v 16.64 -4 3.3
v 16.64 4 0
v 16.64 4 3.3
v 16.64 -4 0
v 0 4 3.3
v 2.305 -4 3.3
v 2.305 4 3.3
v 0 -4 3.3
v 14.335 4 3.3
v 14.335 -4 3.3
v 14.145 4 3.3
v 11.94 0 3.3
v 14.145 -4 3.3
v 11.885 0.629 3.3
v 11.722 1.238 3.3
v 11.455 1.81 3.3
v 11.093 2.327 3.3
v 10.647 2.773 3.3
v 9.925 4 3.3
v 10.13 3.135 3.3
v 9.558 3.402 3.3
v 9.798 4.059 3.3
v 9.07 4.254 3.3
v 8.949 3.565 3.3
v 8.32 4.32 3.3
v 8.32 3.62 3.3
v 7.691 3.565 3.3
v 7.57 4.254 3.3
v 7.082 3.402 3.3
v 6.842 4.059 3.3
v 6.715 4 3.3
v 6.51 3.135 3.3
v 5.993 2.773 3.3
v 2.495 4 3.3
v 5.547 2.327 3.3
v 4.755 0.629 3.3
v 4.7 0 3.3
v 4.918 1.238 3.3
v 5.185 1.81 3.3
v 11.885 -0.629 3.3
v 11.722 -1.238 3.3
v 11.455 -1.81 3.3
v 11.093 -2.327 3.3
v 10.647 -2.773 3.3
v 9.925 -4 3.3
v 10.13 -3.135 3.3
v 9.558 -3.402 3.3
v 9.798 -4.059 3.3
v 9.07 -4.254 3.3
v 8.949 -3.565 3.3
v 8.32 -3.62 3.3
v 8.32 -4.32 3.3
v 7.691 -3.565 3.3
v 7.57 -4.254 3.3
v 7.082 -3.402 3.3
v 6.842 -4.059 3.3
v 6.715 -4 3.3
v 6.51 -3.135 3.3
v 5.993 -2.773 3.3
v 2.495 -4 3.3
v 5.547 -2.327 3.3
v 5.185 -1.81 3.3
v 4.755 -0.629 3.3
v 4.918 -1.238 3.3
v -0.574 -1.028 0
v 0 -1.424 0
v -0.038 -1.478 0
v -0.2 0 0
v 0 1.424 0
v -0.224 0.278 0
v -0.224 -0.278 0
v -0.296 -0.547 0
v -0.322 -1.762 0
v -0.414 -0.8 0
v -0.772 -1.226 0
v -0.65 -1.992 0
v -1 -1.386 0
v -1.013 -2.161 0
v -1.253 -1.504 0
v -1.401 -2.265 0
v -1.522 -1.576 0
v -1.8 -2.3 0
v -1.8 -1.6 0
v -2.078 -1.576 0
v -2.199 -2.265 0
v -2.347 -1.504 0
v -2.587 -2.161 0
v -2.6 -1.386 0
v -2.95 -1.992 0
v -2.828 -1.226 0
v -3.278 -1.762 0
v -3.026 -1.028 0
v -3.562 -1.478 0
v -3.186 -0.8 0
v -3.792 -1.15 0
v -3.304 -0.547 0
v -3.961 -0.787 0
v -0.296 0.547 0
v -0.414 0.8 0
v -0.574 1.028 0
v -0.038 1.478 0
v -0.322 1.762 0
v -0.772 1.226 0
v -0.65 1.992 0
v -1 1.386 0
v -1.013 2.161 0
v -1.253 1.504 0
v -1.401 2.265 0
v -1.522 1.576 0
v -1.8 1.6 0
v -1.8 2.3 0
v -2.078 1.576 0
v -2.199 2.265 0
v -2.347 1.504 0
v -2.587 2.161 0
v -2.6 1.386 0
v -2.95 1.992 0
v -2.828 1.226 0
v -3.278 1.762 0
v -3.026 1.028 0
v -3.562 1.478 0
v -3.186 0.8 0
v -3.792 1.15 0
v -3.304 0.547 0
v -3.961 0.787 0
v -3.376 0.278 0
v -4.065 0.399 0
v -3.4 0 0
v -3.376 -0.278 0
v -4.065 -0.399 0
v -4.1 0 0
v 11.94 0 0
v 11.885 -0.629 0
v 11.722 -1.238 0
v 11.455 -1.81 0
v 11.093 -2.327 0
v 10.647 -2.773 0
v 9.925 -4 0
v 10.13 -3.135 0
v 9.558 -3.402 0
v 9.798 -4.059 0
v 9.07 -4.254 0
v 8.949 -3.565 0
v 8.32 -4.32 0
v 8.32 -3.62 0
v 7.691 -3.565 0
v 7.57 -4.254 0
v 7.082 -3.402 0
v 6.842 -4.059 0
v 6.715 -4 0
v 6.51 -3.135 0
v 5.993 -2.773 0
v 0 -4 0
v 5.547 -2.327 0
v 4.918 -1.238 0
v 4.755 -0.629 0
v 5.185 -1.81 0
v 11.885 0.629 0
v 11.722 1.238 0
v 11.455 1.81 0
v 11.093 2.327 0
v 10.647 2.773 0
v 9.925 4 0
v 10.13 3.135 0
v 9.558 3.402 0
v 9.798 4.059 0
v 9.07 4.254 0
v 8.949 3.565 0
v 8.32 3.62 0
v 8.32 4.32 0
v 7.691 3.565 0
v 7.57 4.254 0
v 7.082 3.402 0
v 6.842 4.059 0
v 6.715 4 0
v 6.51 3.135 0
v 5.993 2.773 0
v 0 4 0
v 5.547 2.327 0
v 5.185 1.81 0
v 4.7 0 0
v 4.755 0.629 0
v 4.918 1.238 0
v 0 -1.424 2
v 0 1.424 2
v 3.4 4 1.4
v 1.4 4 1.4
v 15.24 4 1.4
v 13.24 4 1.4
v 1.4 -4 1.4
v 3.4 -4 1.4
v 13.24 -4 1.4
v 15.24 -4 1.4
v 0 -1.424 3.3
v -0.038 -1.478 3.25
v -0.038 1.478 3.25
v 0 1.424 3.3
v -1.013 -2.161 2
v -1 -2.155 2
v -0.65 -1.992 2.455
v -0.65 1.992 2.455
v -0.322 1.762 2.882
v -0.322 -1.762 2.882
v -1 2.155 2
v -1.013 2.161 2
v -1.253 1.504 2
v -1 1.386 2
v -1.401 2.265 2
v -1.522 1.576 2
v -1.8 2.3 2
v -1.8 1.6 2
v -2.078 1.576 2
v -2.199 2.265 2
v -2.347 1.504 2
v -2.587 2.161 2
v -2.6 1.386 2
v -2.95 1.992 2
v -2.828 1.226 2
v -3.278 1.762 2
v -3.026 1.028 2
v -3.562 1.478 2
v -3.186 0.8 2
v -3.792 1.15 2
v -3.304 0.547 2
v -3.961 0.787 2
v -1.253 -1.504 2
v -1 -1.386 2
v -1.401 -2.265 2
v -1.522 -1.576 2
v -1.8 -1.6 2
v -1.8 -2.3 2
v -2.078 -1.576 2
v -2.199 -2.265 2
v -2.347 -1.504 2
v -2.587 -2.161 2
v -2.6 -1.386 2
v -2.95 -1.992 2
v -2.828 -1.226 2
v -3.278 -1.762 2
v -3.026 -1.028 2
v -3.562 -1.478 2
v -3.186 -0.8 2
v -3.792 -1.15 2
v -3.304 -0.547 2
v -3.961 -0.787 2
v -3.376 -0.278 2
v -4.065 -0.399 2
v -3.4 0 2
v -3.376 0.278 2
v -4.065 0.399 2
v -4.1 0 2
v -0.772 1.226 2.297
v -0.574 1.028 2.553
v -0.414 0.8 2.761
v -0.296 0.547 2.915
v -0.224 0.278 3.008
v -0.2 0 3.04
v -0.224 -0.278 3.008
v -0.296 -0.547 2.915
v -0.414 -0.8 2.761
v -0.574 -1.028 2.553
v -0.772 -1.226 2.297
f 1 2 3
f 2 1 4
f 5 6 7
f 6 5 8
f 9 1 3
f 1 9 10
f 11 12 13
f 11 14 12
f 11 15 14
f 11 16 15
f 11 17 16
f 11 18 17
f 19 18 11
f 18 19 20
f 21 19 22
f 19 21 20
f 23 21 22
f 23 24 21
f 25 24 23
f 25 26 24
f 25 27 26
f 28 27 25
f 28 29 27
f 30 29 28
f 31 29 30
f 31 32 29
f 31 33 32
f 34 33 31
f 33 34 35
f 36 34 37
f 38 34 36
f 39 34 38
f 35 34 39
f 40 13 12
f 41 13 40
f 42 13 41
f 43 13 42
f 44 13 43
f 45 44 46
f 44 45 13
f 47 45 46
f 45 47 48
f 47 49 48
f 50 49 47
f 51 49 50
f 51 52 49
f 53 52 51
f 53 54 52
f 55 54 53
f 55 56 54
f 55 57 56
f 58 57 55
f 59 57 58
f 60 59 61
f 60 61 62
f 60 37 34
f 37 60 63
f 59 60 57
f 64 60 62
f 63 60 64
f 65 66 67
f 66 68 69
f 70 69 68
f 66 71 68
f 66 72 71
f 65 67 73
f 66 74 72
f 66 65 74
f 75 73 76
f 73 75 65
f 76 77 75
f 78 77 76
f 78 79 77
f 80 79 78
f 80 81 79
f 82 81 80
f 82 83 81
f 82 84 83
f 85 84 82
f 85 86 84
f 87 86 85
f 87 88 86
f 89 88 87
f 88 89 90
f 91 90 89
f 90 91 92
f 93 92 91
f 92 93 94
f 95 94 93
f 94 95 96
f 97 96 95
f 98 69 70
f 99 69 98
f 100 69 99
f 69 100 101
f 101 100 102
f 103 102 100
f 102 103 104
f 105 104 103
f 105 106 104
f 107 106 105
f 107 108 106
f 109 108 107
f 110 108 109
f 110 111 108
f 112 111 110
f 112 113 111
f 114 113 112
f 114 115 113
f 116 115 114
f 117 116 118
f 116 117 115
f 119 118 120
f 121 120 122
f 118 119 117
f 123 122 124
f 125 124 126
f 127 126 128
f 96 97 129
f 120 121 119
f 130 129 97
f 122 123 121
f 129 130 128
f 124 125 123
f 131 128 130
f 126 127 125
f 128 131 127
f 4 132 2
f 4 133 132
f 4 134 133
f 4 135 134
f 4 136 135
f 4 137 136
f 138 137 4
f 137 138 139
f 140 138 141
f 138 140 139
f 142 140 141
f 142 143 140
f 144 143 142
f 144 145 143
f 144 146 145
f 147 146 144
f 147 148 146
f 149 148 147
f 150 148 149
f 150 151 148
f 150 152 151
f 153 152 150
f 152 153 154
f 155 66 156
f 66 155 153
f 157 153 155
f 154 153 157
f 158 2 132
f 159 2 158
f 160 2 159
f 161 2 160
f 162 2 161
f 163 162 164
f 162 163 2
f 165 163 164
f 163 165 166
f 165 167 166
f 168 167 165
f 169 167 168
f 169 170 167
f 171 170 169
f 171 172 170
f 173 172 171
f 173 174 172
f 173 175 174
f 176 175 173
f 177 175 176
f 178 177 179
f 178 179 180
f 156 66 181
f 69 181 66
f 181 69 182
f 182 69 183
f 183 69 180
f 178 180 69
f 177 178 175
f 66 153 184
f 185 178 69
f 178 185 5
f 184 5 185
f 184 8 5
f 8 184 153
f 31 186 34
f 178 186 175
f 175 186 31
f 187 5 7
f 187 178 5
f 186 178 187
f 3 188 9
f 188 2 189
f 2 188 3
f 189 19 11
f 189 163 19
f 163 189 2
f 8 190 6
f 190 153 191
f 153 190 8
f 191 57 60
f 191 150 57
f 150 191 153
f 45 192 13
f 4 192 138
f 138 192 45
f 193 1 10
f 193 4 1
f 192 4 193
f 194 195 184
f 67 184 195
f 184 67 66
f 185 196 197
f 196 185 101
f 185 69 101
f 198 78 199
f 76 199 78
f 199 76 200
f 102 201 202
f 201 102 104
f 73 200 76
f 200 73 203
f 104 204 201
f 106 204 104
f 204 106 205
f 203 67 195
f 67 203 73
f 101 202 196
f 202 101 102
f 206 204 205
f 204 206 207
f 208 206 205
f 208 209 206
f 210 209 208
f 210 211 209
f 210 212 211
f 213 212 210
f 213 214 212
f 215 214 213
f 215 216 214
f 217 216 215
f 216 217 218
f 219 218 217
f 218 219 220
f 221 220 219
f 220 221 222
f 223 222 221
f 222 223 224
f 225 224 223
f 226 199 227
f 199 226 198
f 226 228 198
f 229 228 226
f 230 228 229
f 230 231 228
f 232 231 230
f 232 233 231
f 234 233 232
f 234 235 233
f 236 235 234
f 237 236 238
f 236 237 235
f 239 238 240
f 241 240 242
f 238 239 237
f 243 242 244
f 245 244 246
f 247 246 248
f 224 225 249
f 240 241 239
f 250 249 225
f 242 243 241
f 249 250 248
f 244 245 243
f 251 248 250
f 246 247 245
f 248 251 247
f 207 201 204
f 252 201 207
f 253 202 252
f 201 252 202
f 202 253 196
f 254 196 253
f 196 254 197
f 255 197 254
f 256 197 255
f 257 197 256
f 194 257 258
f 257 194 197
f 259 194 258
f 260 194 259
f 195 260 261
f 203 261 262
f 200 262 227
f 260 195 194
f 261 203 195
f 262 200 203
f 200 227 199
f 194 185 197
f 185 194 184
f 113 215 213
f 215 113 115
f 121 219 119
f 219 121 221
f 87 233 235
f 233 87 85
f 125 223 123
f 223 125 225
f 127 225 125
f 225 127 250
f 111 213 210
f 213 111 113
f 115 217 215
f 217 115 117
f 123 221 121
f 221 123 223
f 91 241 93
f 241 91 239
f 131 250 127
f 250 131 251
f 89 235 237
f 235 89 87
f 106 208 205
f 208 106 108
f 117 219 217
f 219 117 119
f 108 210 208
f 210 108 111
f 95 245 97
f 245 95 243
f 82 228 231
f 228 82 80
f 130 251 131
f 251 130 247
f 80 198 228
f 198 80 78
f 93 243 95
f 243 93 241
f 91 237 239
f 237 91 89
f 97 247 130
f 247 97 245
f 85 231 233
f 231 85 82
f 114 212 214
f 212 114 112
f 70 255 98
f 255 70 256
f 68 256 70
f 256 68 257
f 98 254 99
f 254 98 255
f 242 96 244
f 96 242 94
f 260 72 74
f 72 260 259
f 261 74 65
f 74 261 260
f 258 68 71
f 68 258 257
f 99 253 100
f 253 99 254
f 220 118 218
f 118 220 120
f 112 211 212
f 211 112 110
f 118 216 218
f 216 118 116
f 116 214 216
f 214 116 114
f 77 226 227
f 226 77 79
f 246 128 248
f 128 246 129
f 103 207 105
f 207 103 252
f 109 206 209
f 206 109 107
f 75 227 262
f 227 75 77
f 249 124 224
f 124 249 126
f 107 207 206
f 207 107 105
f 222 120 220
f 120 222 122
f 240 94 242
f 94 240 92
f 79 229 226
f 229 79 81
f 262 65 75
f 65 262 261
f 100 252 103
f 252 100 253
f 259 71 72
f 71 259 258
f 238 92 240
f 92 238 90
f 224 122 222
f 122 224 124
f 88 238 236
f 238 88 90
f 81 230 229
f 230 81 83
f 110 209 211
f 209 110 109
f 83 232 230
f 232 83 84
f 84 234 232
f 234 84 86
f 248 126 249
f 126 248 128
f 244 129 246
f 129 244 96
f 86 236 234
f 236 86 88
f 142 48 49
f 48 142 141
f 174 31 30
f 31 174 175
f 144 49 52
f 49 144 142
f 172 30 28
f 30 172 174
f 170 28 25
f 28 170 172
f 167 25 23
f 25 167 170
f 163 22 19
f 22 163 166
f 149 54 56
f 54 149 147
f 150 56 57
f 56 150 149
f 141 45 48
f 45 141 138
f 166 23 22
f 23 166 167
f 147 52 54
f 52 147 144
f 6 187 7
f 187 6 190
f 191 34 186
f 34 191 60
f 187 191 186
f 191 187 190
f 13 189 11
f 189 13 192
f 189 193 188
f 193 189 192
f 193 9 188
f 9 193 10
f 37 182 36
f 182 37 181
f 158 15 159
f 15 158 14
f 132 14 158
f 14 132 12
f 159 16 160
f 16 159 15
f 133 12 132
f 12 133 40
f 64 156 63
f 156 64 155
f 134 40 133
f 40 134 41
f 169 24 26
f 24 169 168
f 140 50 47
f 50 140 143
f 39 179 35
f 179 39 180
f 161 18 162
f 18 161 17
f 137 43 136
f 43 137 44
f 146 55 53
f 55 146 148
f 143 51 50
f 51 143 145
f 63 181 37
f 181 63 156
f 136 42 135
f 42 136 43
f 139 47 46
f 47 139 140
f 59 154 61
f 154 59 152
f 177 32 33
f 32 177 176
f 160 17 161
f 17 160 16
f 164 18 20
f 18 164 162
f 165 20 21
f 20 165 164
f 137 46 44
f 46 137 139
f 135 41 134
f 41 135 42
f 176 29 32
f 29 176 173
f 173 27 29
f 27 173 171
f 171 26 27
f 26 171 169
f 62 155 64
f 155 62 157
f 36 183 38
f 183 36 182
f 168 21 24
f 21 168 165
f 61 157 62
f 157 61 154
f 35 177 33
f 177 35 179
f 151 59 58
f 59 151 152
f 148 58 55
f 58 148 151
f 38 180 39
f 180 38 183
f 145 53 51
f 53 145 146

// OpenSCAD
// Customizable Simple Macro Lens Holder 
//
// Default parameters are for the lens:
//      Size: 7 x 3.3 mm
//      BFL : 6.47 mm
//      ELF : 8.0 mm
//
//  2016.05.18 by gsyan
//
//  update : 2016.05.22
//

//preview[view:south west, tilt:top diagonal];

/* [Parameters] */

//Default parameters are for the lens : Size: 7 x 3.3 mm , BFL : 6.47 mm , ELF : 8.0 mm
lens_diameter = 7.04;

lens_height = 3.3;

//Increase this value you can plug more than 1 lens
lens_total = 1;

//Lens distance adapt for lens_total > 1
lens_distance = 0;

lens_holder_wall_thickness = 1.6;

//
keychain_ring = "true"; //[true:enabled,false:disabled]


rubber_band_holder_shape = "prism"; //[cylinder:cylinder, prism:prism]
rubber_band_holder_height = 2;
rubber_band_holder_width = 8;


keychain_ring_outer_diameter = 4.6;
keychain_ring_inner_diameter = 3.2;
keychain_ring_height = 2;

/* [Hidden] */
fn = 36;
base_rounded_radius = 0; //0.8;
keychain_offset = 0.5;
lens_holder_support_size = 2.4;

module prism(l, w, h){
    polyhedron(
        points=[[0,0,0], [l,0,0], [l,w,0], [0,w,0], [0,w,h], [l,w,h]],
        faces=[[0,1,2,3],[5,4,3,2],[0,4,5,1],[0,3,4],[5,2,1]]
               );
}

module lens_holder_support() {
    resize([lens_holder_support_size+lens_diameter+lens_holder_wall_thickness/2,lens_diameter+lens_holder_wall_thickness,lens_height/2])   
        cylinder(h=lens_height/2,d1=lens_holder_support_size+lens_diameter+lens_holder_wall_thickness/2,d2=lens_diameter+lens_holder_wall_thickness/2,$fn=8);
}

module ring_support() {
    difference() {
        translate([keychain_ring_outer_diameter/2-1-keychain_offset,keychain_ring_outer_diameter/2,0]) 
            rotate([0,0, -90]) 
                prism(keychain_ring_outer_diameter,1,lens_height-keychain_ring_height);
        
        difference() {
            translate([keychain_ring_outer_diameter/-2,keychain_ring_outer_diameter/-2-0.1,-0.1]) 
                cube([ keychain_ring_outer_diameter-keychain_offset+0.01,keychain_ring_outer_diameter+0.2, lens_height-keychain_ring_height+0.2]);
            translate([0,0, -0.1])            cylinder(h=keychain_ring_height+0.2, r=keychain_ring_outer_diameter/2, $fn=36);
        }
        
    }
}

module rubber_band_holder_cylinder() {
    union() {
        rotate(a=[90,0,0]) 
            cylinder(h=rubber_band_holder_width+1, d=rubber_band_holder_height, $fn=36);

        translate([0,(rubber_band_holder_width+1)*-1, rubber_band_holder_height/2-0.1]) 
            cube([0.1, rubber_band_holder_width+1,1]);
    }
}

module rubber_band_holder_prism() {
    resize([rubber_band_holder_height, rubber_band_holder_width+0.2, rubber_band_holder_height+0.1]) rotate([135,0,90]) prism(10, 10, 10);
}
module ring() {
    difference() {
        union() {
            cylinder(h=keychain_ring_height, r=keychain_ring_outer_diameter/2, $fn=36);
            translate([0,0,keychain_ring_height]) ring_support();
        }
        translate([0,0,-10]) cylinder(h=keychain_ring_height+20, r=keychain_ring_inner_diameter/2, $fn=36);
    }
}

module rounded(size, r) {
    //2 cube + 4 cylinder
    fn = 18;
    union() {
        translate([r, 0, 0]) cube([size[0]-2*r, size[1], size[2]]);
        translate([0, r, 0]) cube([size[0], size[1]-2*r, size[2]]);
        
        translate([r, r, 0]) cylinder(h=size[2], r=r, $fn=fn);
        translate([size[0]-r, r, 0]) cylinder(h=size[2], r=r, $fn=fn);
        translate([r, size[1]-r, 0]) cylinder(h=size[2], r=r, $fn=fn);
        translate([size[0]-r, size[1]-r, 0]) cylinder(h=size[2], r=r, $fn=fn);
    }
}

module base() {        
    union() {
        //base : cube
        translate([0, rubber_band_holder_width/-2, 0]) 
        rounded([lens_diameter+lens_holder_wall_thickness+rubber_band_holder_height*4,rubber_band_holder_width, lens_height],base_rounded_radius);
    
        //base : cylinder    
        translate([(lens_diameter+lens_holder_wall_thickness+rubber_band_holder_height*4)/2, 0, 0])
        cylinder(h=lens_height*lens_total+lens_distance*(lens_total-1), r=(lens_diameter+lens_holder_wall_thickness)/2, $fn=fn);
        
        //lens holder support
        if(lens_total > 1) translate([(lens_diameter+lens_holder_wall_thickness+rubber_band_holder_height*4)/2, 0, lens_height])
        lens_holder_support();
        
        //keychain ring
        if(keychain_ring == "true") translate([keychain_offset-keychain_ring_outer_diameter/2,0])       ring();
    }
}
module holder() {
    difference() {
        base();
        
        //lens hole
        translate([(lens_diameter+lens_holder_wall_thickness+rubber_band_holder_height*4)/2, 0, -0.1])
        cylinder(h=lens_height*lens_total+lens_distance*(lens_total-1)+1, r=(lens_diameter+0.2)/2, $fn=fn);
        
        //Ruber Band Holder hole
        
        if( rubber_band_holder_shape == "cylinder") {

        
        //left rubber band hole
        translate([rubber_band_holder_height+0.4, (rubber_band_holder_width+1)/2,lens_height-rubber_band_holder_height/2])
            rubber_band_holder_cylinder();
            
        //right rubber band hole
        translate([lens_diameter+lens_holder_wall_thickness+rubber_band_holder_height*3-0.4, (rubber_band_holder_width+1)/2,lens_height-rubber_band_holder_height/2])
            rubber_band_holder_cylinder();     
        } 
        else {
            
        //left rubber band hole
        translate([rubber_band_holder_width/8+0.4,rubber_band_holder_width/-2-0.1,lens_height+0.1-rubber_band_holder_height])         
        rubber_band_holder_prism();

        //right rubber band hole
        translate([lens_diameter+lens_holder_wall_thickness+rubber_band_holder_height*2.5-0.4,rubber_band_holder_width/-2-0.1,lens_height+0.1-
        rubber_band_holder_height]) rubber_band_holder_prism();
        }

    }
}

holder();

